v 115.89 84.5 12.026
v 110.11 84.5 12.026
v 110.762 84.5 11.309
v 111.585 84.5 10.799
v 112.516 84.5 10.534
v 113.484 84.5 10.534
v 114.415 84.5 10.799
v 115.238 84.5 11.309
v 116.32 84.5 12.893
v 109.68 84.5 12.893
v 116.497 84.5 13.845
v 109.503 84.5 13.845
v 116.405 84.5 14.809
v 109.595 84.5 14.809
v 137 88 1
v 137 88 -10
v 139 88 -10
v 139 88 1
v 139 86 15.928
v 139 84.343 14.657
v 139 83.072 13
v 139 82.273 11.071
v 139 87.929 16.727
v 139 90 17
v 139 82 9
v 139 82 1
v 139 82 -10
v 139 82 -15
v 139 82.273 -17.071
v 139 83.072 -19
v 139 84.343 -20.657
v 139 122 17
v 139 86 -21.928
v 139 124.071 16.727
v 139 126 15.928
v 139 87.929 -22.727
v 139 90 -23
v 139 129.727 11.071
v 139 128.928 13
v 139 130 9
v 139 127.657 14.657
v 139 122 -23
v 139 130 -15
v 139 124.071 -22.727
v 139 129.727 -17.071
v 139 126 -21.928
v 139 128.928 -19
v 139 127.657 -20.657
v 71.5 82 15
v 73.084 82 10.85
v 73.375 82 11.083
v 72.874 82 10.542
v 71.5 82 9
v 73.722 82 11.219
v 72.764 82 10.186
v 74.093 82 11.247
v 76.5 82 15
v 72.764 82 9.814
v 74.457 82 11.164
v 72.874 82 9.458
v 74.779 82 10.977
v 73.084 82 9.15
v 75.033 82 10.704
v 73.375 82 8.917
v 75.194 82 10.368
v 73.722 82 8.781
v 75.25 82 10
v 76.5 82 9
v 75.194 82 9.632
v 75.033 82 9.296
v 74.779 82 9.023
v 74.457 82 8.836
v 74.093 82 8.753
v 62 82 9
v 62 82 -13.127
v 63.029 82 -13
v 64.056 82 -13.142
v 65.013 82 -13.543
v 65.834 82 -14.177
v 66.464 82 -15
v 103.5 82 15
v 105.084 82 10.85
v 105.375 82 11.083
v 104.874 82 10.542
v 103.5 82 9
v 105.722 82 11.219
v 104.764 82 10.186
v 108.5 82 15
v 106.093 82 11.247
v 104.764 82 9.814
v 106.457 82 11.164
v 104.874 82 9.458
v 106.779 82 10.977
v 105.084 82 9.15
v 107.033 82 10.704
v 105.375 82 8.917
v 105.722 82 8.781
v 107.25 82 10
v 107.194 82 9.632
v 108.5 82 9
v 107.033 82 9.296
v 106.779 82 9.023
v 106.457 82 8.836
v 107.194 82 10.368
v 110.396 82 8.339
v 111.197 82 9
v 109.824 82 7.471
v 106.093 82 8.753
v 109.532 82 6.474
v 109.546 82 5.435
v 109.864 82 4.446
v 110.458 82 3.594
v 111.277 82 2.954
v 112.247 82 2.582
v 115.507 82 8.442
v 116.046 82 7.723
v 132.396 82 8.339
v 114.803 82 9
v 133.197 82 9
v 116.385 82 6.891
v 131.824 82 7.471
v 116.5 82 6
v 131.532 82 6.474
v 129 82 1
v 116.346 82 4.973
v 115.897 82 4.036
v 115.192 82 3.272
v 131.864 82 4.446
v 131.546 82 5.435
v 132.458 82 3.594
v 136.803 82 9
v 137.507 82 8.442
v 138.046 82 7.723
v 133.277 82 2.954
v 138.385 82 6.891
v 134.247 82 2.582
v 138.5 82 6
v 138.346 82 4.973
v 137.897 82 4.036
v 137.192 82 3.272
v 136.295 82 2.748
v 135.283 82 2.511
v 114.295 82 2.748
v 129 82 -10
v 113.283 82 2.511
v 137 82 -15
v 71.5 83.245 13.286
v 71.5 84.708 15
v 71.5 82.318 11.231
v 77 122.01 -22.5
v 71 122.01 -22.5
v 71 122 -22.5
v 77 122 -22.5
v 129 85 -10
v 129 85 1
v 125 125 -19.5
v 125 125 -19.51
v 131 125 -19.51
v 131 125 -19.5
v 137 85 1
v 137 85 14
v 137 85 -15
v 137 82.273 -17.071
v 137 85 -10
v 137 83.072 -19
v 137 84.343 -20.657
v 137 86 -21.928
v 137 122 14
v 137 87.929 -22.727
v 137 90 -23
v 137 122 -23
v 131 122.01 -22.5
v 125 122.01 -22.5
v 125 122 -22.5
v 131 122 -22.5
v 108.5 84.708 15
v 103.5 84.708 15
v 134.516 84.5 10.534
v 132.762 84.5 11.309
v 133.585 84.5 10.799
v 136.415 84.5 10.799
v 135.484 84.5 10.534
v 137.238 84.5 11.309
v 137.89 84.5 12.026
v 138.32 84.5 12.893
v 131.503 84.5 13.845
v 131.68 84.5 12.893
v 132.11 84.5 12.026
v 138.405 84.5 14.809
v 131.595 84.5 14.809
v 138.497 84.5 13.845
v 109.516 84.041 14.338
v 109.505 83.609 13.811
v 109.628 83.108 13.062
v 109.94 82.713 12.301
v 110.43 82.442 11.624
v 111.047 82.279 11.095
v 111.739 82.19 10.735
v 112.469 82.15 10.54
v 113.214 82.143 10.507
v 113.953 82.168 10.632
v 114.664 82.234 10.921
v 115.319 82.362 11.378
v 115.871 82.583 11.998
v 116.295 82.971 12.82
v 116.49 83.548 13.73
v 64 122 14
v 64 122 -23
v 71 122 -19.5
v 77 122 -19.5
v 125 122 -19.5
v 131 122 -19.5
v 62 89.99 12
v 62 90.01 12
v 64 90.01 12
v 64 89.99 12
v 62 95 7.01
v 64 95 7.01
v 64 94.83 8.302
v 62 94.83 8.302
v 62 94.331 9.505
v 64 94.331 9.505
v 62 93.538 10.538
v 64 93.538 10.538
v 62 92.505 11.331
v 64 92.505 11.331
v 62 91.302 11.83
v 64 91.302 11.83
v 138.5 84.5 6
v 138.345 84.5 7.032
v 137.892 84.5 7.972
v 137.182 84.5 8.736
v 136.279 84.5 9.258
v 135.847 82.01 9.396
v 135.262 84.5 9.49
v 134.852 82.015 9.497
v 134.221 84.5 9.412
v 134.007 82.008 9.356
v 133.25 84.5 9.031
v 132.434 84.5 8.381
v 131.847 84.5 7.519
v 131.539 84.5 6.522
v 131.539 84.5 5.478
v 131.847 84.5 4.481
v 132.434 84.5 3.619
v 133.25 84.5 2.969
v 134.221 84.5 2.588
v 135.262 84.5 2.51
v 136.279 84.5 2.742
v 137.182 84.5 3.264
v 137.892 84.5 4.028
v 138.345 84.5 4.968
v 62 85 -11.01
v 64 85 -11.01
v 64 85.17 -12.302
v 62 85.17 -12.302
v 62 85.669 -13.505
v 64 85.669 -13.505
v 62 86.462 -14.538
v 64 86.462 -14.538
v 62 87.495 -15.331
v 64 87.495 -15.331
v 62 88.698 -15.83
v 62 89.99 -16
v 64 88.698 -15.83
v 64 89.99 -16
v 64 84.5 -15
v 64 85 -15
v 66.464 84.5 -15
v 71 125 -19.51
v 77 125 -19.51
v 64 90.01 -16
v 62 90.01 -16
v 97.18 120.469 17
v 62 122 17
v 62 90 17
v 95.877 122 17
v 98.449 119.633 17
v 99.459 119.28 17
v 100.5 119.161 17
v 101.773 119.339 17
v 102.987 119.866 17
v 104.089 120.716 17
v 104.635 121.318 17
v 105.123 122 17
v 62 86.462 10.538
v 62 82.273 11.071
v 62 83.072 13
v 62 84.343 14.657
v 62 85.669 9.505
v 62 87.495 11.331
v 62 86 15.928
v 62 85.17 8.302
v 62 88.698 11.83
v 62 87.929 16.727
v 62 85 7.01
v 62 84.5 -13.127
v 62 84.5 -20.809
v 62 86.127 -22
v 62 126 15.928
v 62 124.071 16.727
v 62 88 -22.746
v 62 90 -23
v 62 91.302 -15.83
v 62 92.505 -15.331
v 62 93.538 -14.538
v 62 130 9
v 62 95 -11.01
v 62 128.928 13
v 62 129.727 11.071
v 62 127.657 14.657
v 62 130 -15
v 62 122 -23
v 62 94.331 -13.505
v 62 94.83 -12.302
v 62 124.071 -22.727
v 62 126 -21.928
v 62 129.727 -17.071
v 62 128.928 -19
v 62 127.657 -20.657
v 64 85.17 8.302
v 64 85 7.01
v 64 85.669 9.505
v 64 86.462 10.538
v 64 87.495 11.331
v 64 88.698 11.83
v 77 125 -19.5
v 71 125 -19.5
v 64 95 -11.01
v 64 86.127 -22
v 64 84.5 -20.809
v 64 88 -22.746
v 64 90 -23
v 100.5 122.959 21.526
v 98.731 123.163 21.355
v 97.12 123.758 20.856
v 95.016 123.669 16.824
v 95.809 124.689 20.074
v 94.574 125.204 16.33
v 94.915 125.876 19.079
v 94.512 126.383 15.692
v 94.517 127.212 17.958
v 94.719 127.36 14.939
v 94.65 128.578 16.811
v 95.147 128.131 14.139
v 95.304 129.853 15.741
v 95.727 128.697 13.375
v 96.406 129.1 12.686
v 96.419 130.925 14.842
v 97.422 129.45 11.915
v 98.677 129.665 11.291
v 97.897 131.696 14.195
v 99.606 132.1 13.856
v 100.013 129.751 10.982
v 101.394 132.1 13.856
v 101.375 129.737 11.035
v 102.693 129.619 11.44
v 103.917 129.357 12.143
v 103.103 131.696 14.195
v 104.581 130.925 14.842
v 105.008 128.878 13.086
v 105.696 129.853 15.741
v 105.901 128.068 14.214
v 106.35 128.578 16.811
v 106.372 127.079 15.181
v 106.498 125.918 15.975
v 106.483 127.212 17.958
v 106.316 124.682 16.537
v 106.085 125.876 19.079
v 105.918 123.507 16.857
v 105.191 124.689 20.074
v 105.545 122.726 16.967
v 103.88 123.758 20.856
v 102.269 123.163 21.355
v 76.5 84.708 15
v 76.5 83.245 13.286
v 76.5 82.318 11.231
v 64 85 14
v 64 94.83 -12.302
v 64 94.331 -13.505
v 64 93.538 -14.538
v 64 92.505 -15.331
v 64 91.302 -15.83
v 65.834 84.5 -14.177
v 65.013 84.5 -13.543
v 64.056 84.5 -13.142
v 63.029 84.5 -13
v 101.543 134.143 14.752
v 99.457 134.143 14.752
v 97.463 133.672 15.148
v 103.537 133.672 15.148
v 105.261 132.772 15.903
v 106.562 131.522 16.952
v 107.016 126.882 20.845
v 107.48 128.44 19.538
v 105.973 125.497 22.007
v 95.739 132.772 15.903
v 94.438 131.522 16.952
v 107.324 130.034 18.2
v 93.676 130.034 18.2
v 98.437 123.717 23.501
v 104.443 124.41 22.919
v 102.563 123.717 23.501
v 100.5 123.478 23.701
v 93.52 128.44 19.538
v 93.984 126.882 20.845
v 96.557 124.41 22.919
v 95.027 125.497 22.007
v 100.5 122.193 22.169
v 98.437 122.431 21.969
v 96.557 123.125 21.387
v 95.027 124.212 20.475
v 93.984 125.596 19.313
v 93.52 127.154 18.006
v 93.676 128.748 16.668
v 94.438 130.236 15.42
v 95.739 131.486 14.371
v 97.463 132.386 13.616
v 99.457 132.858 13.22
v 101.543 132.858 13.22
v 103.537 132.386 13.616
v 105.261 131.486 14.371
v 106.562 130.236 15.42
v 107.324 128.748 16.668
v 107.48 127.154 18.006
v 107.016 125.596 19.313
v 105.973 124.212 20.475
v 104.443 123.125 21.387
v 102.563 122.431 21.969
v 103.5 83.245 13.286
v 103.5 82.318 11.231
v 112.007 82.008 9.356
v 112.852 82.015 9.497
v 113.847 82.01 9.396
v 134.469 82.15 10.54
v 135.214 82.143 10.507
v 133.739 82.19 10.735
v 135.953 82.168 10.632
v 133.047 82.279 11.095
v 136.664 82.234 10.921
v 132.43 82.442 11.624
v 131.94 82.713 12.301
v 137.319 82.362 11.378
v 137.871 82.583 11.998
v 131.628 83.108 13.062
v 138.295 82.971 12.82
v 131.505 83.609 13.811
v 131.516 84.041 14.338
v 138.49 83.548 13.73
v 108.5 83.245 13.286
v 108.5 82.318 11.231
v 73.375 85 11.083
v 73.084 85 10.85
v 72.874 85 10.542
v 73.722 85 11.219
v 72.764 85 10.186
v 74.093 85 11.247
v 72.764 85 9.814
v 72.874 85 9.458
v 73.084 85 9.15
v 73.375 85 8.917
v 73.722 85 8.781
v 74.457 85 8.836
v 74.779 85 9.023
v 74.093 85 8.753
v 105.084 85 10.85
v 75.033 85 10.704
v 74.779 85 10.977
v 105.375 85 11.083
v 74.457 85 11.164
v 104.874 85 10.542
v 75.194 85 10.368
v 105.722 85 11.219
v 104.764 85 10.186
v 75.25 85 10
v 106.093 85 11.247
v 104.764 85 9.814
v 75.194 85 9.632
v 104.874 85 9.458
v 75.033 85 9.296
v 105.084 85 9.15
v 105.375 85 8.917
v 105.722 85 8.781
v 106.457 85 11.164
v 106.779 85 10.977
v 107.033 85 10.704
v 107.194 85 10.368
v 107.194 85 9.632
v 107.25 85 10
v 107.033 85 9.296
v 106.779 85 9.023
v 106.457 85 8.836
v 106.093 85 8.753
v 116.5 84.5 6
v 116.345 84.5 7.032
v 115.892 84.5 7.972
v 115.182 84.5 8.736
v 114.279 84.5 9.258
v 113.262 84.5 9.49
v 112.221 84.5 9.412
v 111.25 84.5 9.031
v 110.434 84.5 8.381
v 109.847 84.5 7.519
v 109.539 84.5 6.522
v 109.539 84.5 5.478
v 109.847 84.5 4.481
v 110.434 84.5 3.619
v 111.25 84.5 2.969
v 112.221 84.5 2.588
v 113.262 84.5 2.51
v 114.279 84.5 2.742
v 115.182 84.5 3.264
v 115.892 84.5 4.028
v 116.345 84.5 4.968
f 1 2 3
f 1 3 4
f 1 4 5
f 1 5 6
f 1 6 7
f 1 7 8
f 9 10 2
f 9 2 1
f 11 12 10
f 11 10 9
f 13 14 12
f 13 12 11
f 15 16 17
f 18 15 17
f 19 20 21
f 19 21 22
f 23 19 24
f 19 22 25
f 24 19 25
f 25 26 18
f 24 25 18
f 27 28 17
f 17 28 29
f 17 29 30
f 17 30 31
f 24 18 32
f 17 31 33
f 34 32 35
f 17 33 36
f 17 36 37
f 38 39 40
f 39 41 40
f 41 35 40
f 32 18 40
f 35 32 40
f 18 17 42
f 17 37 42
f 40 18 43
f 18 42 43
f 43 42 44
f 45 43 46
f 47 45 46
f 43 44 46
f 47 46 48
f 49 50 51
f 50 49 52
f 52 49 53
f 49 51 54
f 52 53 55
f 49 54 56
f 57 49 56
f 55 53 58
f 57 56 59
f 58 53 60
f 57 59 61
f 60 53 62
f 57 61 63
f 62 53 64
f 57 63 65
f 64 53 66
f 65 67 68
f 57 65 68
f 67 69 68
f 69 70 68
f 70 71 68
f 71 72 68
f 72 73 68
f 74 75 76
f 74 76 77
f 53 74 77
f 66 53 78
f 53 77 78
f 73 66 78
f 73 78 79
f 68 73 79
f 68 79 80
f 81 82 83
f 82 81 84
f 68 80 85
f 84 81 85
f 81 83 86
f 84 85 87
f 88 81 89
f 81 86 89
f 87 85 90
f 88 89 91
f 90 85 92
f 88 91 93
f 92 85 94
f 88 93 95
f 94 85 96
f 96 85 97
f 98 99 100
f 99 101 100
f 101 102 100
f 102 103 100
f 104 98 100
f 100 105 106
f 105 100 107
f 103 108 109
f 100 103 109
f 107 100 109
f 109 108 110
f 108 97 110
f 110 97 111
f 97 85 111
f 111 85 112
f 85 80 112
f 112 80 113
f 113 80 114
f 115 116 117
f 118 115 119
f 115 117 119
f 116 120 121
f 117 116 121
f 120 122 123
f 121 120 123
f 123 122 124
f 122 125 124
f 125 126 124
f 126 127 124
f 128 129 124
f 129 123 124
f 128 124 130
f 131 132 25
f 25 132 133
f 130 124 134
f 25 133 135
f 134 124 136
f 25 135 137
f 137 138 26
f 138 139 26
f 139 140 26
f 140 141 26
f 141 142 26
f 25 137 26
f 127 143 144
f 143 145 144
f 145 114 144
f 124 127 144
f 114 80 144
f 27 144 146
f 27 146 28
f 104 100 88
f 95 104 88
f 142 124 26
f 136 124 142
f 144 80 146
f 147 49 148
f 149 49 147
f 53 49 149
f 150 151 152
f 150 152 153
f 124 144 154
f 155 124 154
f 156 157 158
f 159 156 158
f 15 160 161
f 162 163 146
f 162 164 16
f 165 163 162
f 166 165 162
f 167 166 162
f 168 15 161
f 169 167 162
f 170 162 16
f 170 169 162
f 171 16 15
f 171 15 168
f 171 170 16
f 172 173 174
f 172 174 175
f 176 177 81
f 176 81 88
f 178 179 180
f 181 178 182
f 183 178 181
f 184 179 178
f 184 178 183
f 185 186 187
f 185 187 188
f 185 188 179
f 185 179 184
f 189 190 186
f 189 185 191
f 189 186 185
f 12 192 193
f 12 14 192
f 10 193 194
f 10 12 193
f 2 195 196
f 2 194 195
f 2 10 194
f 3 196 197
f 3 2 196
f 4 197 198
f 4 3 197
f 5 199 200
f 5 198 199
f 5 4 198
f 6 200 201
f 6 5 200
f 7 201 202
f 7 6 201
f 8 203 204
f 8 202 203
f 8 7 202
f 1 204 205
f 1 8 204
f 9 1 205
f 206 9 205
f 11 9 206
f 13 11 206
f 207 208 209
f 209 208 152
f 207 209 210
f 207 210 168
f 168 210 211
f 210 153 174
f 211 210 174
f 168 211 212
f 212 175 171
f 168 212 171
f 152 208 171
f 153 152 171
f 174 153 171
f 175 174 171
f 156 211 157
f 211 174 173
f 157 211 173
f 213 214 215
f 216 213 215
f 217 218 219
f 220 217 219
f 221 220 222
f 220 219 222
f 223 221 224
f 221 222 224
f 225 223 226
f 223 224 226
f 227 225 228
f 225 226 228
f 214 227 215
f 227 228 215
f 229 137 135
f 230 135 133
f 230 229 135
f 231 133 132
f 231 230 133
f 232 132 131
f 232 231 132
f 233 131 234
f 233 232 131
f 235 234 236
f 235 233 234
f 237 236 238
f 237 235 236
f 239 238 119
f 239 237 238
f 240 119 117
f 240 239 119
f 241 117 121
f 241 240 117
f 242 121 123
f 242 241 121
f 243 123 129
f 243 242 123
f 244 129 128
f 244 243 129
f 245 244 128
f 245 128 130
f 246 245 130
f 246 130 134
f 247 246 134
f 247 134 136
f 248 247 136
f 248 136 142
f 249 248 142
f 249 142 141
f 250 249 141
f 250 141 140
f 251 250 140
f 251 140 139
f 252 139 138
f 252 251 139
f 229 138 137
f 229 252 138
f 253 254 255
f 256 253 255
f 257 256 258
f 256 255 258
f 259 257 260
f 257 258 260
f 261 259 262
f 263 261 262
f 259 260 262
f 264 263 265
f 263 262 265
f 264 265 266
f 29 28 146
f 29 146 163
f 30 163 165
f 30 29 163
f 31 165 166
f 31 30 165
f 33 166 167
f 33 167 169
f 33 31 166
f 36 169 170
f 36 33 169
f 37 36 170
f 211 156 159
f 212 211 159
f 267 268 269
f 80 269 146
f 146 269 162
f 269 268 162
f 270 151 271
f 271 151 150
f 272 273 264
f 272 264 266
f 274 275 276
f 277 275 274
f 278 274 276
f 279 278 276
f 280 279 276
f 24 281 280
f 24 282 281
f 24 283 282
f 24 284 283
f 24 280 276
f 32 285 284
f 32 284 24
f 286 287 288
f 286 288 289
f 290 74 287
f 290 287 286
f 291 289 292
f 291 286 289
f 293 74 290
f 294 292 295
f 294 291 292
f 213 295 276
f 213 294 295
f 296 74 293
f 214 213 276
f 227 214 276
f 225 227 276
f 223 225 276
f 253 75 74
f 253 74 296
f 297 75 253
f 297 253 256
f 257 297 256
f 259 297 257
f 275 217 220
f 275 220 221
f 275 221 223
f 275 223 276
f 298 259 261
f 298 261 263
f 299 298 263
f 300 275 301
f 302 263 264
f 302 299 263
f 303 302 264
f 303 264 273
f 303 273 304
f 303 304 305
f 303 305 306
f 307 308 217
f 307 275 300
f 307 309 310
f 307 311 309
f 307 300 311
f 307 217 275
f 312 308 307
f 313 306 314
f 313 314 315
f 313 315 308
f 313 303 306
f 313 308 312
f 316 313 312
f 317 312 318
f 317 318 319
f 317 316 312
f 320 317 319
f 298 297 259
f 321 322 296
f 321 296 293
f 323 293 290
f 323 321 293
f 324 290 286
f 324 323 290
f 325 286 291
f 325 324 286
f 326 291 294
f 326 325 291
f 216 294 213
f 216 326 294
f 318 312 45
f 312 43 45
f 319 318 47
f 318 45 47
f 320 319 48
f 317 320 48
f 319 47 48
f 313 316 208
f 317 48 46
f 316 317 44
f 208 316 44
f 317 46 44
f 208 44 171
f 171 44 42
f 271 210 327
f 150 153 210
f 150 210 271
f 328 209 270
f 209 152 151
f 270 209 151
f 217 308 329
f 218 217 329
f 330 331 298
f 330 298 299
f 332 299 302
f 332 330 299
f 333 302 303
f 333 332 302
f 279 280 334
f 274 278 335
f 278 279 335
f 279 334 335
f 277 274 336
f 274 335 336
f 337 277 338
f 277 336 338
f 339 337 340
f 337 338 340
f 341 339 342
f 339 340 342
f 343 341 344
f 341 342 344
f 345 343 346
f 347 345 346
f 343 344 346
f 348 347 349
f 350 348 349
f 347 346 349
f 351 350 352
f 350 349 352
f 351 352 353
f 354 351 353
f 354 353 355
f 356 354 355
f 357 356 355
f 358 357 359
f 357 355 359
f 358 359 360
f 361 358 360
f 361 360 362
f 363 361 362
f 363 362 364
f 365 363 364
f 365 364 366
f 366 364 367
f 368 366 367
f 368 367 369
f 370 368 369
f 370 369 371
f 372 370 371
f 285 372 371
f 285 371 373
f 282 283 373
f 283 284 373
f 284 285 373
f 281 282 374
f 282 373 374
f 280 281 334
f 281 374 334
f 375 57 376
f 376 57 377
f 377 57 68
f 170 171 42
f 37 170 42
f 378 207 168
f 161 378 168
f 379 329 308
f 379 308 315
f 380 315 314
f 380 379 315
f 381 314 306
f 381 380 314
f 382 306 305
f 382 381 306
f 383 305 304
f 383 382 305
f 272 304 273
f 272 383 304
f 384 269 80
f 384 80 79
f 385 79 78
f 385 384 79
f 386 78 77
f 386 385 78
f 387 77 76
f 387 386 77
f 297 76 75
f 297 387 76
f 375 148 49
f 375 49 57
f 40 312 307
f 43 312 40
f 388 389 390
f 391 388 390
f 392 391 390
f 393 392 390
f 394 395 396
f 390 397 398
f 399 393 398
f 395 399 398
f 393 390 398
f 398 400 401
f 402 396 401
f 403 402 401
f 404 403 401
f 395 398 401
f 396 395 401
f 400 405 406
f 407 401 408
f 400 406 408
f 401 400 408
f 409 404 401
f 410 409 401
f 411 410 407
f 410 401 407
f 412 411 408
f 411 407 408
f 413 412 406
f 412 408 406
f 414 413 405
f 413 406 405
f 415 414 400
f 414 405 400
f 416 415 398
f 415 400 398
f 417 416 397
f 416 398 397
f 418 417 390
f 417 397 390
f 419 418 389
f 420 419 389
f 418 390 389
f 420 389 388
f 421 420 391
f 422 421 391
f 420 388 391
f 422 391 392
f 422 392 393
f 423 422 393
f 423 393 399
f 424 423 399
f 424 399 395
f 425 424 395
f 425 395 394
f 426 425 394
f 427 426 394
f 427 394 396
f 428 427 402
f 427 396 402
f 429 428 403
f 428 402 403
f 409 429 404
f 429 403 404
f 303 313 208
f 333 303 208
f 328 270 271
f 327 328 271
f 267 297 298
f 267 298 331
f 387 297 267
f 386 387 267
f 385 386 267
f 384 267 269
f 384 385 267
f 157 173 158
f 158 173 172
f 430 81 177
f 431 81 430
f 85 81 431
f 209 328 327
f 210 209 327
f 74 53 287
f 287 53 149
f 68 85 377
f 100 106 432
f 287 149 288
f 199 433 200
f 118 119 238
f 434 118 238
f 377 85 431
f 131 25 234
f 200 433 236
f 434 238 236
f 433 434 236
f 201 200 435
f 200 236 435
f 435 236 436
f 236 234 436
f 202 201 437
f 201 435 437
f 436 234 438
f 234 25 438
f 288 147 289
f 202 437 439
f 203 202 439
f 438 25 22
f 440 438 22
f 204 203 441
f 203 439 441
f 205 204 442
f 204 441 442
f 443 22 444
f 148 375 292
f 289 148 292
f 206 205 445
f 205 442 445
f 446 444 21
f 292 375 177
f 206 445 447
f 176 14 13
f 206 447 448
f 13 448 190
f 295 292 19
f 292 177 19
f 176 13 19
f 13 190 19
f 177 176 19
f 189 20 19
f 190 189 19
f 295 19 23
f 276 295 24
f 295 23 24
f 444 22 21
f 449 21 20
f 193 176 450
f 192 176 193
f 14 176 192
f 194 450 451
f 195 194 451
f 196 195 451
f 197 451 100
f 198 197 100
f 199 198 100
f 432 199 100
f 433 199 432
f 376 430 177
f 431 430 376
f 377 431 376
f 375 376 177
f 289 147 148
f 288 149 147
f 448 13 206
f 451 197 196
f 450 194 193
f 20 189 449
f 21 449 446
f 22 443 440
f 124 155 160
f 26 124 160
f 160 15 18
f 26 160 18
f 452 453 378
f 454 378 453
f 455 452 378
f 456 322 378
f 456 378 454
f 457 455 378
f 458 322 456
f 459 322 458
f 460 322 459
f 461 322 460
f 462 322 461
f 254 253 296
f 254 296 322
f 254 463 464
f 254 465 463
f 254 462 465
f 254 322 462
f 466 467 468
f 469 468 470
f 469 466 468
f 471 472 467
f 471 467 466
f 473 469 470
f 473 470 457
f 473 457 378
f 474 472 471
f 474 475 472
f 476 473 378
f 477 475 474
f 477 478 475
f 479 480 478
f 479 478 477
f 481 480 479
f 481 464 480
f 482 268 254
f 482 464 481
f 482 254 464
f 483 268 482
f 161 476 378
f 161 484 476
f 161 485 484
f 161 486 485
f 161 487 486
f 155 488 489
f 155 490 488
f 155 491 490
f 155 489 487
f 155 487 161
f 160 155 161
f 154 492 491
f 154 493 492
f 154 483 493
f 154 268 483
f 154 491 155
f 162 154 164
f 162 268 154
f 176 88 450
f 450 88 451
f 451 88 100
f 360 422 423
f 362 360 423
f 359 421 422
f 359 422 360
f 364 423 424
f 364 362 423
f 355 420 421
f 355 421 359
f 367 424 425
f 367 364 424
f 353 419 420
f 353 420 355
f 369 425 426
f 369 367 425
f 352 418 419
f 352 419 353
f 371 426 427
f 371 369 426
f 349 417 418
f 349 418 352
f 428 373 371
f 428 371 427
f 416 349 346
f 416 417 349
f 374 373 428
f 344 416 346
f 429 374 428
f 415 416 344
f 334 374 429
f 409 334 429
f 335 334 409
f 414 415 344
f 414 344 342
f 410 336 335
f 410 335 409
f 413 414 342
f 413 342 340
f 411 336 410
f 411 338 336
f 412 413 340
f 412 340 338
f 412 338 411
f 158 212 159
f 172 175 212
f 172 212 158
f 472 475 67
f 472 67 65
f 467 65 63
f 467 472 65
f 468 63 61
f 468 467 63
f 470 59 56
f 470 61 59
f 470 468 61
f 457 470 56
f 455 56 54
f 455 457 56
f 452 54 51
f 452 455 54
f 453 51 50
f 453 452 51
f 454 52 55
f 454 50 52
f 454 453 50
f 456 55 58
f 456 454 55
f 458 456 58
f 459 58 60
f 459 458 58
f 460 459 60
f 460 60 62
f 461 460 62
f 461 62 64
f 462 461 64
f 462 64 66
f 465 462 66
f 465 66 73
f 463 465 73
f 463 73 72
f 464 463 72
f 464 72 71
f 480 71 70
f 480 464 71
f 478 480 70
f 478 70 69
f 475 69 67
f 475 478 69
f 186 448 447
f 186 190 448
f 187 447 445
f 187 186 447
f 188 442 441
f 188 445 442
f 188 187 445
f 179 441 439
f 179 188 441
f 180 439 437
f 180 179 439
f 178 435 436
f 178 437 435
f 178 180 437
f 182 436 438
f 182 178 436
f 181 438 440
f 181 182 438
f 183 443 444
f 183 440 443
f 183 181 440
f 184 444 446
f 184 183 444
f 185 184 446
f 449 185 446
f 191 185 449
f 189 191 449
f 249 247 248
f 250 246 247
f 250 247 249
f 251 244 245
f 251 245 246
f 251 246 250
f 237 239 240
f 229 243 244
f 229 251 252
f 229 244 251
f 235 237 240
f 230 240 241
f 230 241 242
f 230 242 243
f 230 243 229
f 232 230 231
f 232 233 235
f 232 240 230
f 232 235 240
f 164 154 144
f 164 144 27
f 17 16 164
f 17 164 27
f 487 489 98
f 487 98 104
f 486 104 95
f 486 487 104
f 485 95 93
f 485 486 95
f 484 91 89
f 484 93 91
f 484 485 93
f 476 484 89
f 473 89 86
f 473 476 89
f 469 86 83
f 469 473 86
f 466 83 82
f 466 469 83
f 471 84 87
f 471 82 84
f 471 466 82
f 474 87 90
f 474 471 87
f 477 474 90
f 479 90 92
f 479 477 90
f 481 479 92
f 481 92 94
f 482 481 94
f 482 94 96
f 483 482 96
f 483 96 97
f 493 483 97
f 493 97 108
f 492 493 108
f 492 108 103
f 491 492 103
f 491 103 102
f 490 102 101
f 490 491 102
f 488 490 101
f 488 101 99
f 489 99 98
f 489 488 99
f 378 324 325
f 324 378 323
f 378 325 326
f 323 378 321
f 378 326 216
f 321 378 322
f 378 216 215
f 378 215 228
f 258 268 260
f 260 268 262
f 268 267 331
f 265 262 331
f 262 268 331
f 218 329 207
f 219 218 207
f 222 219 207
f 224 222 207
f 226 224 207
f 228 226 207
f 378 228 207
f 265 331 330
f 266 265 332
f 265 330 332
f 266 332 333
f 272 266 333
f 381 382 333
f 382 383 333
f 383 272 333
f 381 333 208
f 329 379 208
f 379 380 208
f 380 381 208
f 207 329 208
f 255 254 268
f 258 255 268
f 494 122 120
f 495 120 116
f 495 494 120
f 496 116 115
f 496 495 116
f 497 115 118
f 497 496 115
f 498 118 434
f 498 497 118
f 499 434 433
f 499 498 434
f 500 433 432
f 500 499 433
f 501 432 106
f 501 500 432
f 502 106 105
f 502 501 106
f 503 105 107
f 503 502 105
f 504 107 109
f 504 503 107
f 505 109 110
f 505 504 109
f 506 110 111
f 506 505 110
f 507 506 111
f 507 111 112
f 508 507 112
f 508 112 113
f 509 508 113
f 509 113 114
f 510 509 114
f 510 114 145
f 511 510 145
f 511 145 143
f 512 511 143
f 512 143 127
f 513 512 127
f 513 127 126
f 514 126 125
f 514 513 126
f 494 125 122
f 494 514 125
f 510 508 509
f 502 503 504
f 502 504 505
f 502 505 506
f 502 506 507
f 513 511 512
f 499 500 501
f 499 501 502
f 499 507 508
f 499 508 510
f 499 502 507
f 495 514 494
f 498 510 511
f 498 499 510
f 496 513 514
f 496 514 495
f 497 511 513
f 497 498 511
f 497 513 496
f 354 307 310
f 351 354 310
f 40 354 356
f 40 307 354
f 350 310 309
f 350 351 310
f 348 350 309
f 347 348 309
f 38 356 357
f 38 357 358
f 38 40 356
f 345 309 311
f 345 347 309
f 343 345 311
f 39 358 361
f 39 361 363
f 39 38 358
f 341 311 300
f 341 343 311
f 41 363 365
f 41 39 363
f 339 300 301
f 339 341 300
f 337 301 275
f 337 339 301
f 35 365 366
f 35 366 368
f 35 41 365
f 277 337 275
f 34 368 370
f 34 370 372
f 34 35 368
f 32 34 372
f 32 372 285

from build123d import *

# Parameters (mm, degrees)
CYLINDER027_R               = 4
CYLINDER027_DEPTH           = 2.5
CYLINDER027_ROLL_ANGLE      = 90
BOX036_W                    = 14
BOX036_H                    = 10
BOX036_DEPTH                = 11
CYLINDER023_R               = 1.25
CYLINDER023_DEPTH           = 15
CYLINDER023_ROLL_ANGLE      = 90
CYLINDER024_R               = 1.25
CYLINDER024_DEPTH           = 15
CYLINDER024_ROLL_ANGLE      = 90
CYLINDER018_R               = 3.5
CYLINDER018_DEPTH           = 10
CYLINDER019_R               = 3.5
CYLINDER019_DEPTH           = 10
FUSION020_ROLL_ANGLE        = 90
CYLINDER021_R               = 3.5
CYLINDER021_DEPTH           = 10
CYLINDER020_R               = 3.5
CYLINDER020_DEPTH           = 10
FUSION022_ROLL_ANGLE        = 90
BOX018_W                    = 5
BOX018_H                    = 3
BOX018_DEPTH                = 10
BOX035_W                    = 5
BOX035_H                    = 3
BOX035_DEPTH                = 10
BOX025_W                    = 20
BOX025_H                    = 10
BOX025_DEPTH                = 5
BOX024_W                    = 10
BOX024_H                    = 10
BOX024_DEPTH                = 28
FILLET010_R                 = 4.99
BOX022_W                    = 6
BOX022_H                    = 3
BOX022_DEPTH                = 3
CHAMFER002_SIZE             = 2.99
BOX020_W                    = 6
BOX020_H                    = 3
BOX020_DEPTH                = 3
CHAMFER_SIZE                = 2.99
BOX010_W                    = 73
BOX010_H                    = 10
BOX010_DEPTH                = 8
BOX002_W                    = 73
BOX002_H                    = 37
BOX002_DEPTH                = 40
BOX_W                       = 77
BOX_H                       = 48
BOX_DEPTH                   = 40
FILLET_R                    = 8
CYLINDER001_R               = 7
CYLINDER001_DEPTH           = 2
CYLINDER001_PLACEMENT_ANGLE = 29.99999
CYLINDER_R                  = 6
CYLINDER_DEPTH              = 10
CYLINDER_PLACEMENT_ANGLE    = 29.99999
FUSION004_ROLL_ANGLE        = 180
FUSION004_PITCH_ANGLE       = -70
FUSION004_PLACEMENT_ANGLE   = -90


with BuildPart() as cylinder027:
    # Cylinder027 → Cylinder027 (new body)
    with BuildSketch(Plane.XY):
        Circle(CYLINDER027_R)
    extrude(amount=CYLINDER027_DEPTH)


with BuildPart() as cylinder027_1:
    # Cylinder027 roll: moved
    add(cylinder027.part.rotate(Axis((0, 0, 0), (1, 0, 0)), CYLINDER027_ROLL_ANGLE))


with BuildPart() as cylinder027_2:
    # Cylinder027 placement: moved
    add(cylinder027_1.part.moved(Location((63, 84.5, -17))))


with BuildPart() as cube:
    # Box036 → Box036 (new body)
    with BuildSketch(Plane(origin=(129, 78, -10), x_dir=(1, 0, 0), z_dir=(0, 0, 1))):
        with Locations((7, 5)):
            Rectangle(BOX036_W, BOX036_H)
    extrude(amount=BOX036_DEPTH)


with BuildPart() as cylinder023:
    # Cylinder023 → Cylinder023 (new body)
    with BuildSketch(Plane.XY):
        Circle(CYLINDER023_R)
    extrude(amount=CYLINDER023_DEPTH)


with BuildPart() as cylinder023_1:
    # Cylinder023 roll: moved
    add(cylinder023.part.rotate(Axis((0, 0, 0), (1, 0, 0)), CYLINDER023_ROLL_ANGLE))


with BuildPart() as cylinder023_2:
    # Cylinder023 placement: moved
    add(cylinder023_1.part.moved(Location((74, 97, 10))))


with BuildPart() as fusion031:
    # Cylinder024 → Cylinder024 (new body)
    with BuildSketch(Plane.XY):
        Circle(CYLINDER024_R)
    extrude(amount=CYLINDER024_DEPTH)


with BuildPart() as fusion031_1:
    # Cylinder024 roll: moved
    add(fusion031.part.rotate(Axis((0, 0, 0), (1, 0, 0)), CYLINDER024_ROLL_ANGLE))


with BuildPart() as fusion031_2:
    # Cylinder024 placement: moved
    add(fusion031_1.part.moved(Location((106, 97, 10))))

    # Fusion031: union Cylinder023
    add(cylinder023_2.part)


with BuildPart() as fusion031_3:
    # Fusion031 placement: moved
    add(fusion031_2.part.moved(Location((0, -8, 0))))


with BuildPart() as cylinder018:
    # Cylinder018 → Cylinder018 (new body)
    with BuildSketch(Plane(origin=(-8, 25.5, 0), x_dir=(1, 0, 0), z_dir=(0, 0, 1))):
        Circle(CYLINDER018_R)
    extrude(amount=CYLINDER018_DEPTH)


with BuildPart() as fusion020:
    # Cylinder019 → Cylinder019 (new body)
    with BuildSketch(Plane(origin=(-8, 33.5, 0), x_dir=(1, 0, 0), z_dir=(0, 0, 1))):
        Circle(CYLINDER019_R)
    extrude(amount=CYLINDER019_DEPTH)

    # Fusion020: union Cylinder018
    add(cylinder018.part)


with BuildPart() as fusion020_1:
    # Fusion020 roll: moved
    add(fusion020.part.rotate(Axis((0, 0, 0), (1, 0, 0)), FUSION020_ROLL_ANGLE))


with BuildPart() as fusion020_2:
    # Fusion020 placement: moved
    add(fusion020_1.part.moved(Location((312, 84.5, -19.5))))


with BuildPart() as cylinder021:
    # Cylinder021 → Cylinder021 (new body)
    with BuildSketch(Plane(origin=(-8, 25.5, 0), x_dir=(1, 0, 0), z_dir=(0, 0, 1))):
        Circle(CYLINDER021_R)
    extrude(amount=CYLINDER021_DEPTH)


with BuildPart() as fusion023:
    # Cylinder020 → Cylinder020 (new body)
    with BuildSketch(Plane(origin=(-8, 33.5, 0), x_dir=(1, 0, 0), z_dir=(0, 0, 1))):
        Circle(CYLINDER020_R)
    extrude(amount=CYLINDER020_DEPTH)

    # Fusion022: union Cylinder021
    add(cylinder021.part)


with BuildPart() as fusion023_1:
    # Fusion022 roll: moved
    add(fusion023.part.rotate(Axis((0, 0, 0), (1, 0, 0)), FUSION022_ROLL_ANGLE))


with BuildPart() as fusion023_2:
    # Fusion022 placement: moved
    add(fusion023_1.part.moved(Location((334, 84.5, -19.5))))

    # Fusion023: union Fusion020
    add(fusion020_2.part)


with BuildPart() as fusion023_3:
    # Fusion023 placement: moved
    add(fusion023_2.part.moved(Location((-191, 0, 0))))


with BuildPart() as box018:
    # Box018 → Box018 (new body)
    with BuildSketch(Plane(origin=(71.5, 82, 5), x_dir=(1, 0, 0), z_dir=(0, 0, 1))):
        with Locations((2.5, 1.5)):
            Rectangle(BOX018_W, BOX018_H)
    extrude(amount=BOX018_DEPTH)


with BuildPart() as box035:
    # Box035 → Box035 (new body)
    with BuildSketch(Plane(origin=(103.5, 82, 5), x_dir=(1, 0, 0), z_dir=(0, 0, 1))):
        with Locations((2.5, 1.5)):
            Rectangle(BOX035_W, BOX035_H)
    extrude(amount=BOX035_DEPTH)


with BuildPart() as box025:
    # Box025 → Box025 (new body)
    with BuildSketch(Plane(origin=(90, 112, 9), x_dir=(1, 0, 0), z_dir=(0, 0, 1))):
        with Locations((10, 5)):
            Rectangle(BOX025_W, BOX025_H)
    extrude(amount=BOX025_DEPTH)


with BuildPart() as fillet010:
    # Box024 → Box024 (new body)
    with BuildSketch(Plane(origin=(54, 85, -16), x_dir=(1, 0, 0), z_dir=(0, 0, 1))):
        with Locations((5, 5)):
            Rectangle(BOX024_W, BOX024_H)
    extrude(amount=BOX024_DEPTH)

    # Fillet010
    fillet010_edges = [fillet010.edges().sort_by_distance(p)[0] for p in [
        (59, 85, -16),
        (59, 85, 12),
        (59, 95, -16),
        (59, 95, 12),
    ]]
    fillet(fillet010_edges, radius=FILLET010_R)


with BuildPart() as chamfer002:
    # Box022 → Box022 (new body)
    with BuildSketch(Plane(origin=(70, 113, -23), x_dir=(1, 0, 0), z_dir=(0, 0, 1))):
        with Locations((3, 1.5)):
            Rectangle(BOX022_W, BOX022_H)
    extrude(amount=BOX022_DEPTH)

    # Chamfer002
    chamfer002_edges = [chamfer002.edges().sort_by_distance(p)[0] for p in [
        (73, 116, -23),
    ]]
    chamfer(chamfer002_edges, length=CHAMFER002_SIZE)


with BuildPart() as chamfer002_1:
    # Chamfer002 placement: moved
    add(chamfer002.part.moved(Location((55, 9, 0.5))))


with BuildPart() as fusion028:
    # Box020 → Box020 (new body)
    with BuildSketch(Plane(origin=(70, 113, -23), x_dir=(1, 0, 0), z_dir=(0, 0, 1))):
        with Locations((3, 1.5)):
            Rectangle(BOX020_W, BOX020_H)
    extrude(amount=BOX020_DEPTH)

    # Chamfer
    chamfer_edges = [fusion028.edges().sort_by_distance(p)[0] for p in [
        (73, 116, -23),
    ]]
    chamfer(chamfer_edges, length=CHAMFER_SIZE)


with BuildPart() as fusion028_1:
    # Chamfer placement: moved
    add(fusion028.part.moved(Location((1, 9, 0.5))))

    # Fusion028: union Chamfer002
    add(chamfer002_1.part)


with BuildPart() as box010:
    # Box010 → Box010 (new body)
    with BuildSketch(Plane(origin=(64, 82, -23), x_dir=(1, 0, 0), z_dir=(0, 0, 1))):
        with Locations((36.5, 5)):
            Rectangle(BOX010_W, BOX010_H)
    extrude(amount=BOX010_DEPTH)


with BuildPart() as box002:
    # Box002 → Box002 (new body)
    with BuildSketch(Plane(origin=(64, 85, -26), x_dir=(1, 0, 0), z_dir=(0, 0, 1))):
        with Locations((36.5, 18.5)):
            Rectangle(BOX002_W, BOX002_H)
    extrude(amount=BOX002_DEPTH)


with BuildPart() as cut019:
    # Box → Box (new body)
    with BuildSketch(Plane(origin=(62, 82, -27), x_dir=(1, 0, 0), z_dir=(0, 0, 1))):
        with Locations((38.5, 24)):
            Rectangle(BOX_W, BOX_H)
    extrude(amount=BOX_DEPTH)

    # Fillet
    fillet_edges = [cut019.edges().sort_by_distance(p)[0] for p in [
        (100.5, 82, -27),
        (100.5, 82, 13),
        (100.5, 130, -27),
        (100.5, 130, 13),
    ]]
    fillet(fillet_edges, radius=FILLET_R)


with BuildPart() as cut019_1:
    # Fillet placement: moved
    add(cut019.part.moved(Location((0, 0, 4))))

    # Cut001: cut Box002
    add(box002.part, mode=Mode.SUBTRACT)

    # Cut004: cut Box010
    add(box010.part, mode=Mode.SUBTRACT)

    # Cut018: cut Fusion028
    add(fusion028_1.part, mode=Mode.SUBTRACT)

    # Cut019: cut Fillet010
    add(fillet010.part, mode=Mode.SUBTRACT)


with BuildPart() as cylinder001:
    # Cylinder001 → Cylinder001 (new body)
    with BuildSketch(Plane.XY):
        Circle(CYLINDER001_R)
    extrude(amount=CYLINDER001_DEPTH)


with BuildPart() as cylinder001_1:
    # Cylinder001 placement: moved
    add(cylinder001.part.moved(Location((51, 75, -3))).rotate(Axis((51, 75, -3), (0, -1, 0)), CYLINDER001_PLACEMENT_ANGLE))


with BuildPart() as cut025:
    # Cylinder → Cylinder (new body)
    with BuildSketch(Plane.XY):
        Circle(CYLINDER_R)
    extrude(amount=CYLINDER_DEPTH)


with BuildPart() as cut025_1:
    # Cylinder placement: moved
    add(cut025.part.moved(Location((51, 75, -3))).rotate(Axis((51, 75, -3), (0, -1, 0)), CYLINDER_PLACEMENT_ANGLE))

    # Fusion004: union Cylinder001
    add(cylinder001_1.part)


with BuildPart() as cut025_2:
    # Fusion004 roll: moved
    add(cut025_1.part.rotate(Axis((0, 0, 0), (1, 0, 0)), FUSION004_ROLL_ANGLE))


with BuildPart() as cut025_3:
    # Fusion004 pitch: moved
    add(cut025_2.part.rotate(Axis((0, 0, 0), (0, 1, 0)), FUSION004_PITCH_ANGLE))


with BuildPart() as cut025_4:
    # Fusion004 placement: moved
    add(cut025_3.part.moved(Location((175.5, 143.464742, -29.748779))).rotate(Axis((175.5, 143.464742, -29.748779), (0, 0, 1)), FUSION004_PLACEMENT_ANGLE))

    # Fusion029: union Cut019
    add(cut019_1.part)

    # Cut020: cut Box025
    add(box025.part, mode=Mode.SUBTRACT)

    # Fusion030: union Box018, Box035
    add(box018.part)
    add(box035.part)

    # Cut021: cut Fusion023
    add(fusion023_3.part, mode=Mode.SUBTRACT)

    # Cut022: cut Fusion031
    add(fusion031_3.part, mode=Mode.SUBTRACT)

    # Cut023: cut Cube
    add(cube.part, mode=Mode.SUBTRACT)

    # Cut025: cut Cylinder027
    add(cylinder027_2.part, mode=Mode.SUBTRACT)


solid = cut025_4.part
